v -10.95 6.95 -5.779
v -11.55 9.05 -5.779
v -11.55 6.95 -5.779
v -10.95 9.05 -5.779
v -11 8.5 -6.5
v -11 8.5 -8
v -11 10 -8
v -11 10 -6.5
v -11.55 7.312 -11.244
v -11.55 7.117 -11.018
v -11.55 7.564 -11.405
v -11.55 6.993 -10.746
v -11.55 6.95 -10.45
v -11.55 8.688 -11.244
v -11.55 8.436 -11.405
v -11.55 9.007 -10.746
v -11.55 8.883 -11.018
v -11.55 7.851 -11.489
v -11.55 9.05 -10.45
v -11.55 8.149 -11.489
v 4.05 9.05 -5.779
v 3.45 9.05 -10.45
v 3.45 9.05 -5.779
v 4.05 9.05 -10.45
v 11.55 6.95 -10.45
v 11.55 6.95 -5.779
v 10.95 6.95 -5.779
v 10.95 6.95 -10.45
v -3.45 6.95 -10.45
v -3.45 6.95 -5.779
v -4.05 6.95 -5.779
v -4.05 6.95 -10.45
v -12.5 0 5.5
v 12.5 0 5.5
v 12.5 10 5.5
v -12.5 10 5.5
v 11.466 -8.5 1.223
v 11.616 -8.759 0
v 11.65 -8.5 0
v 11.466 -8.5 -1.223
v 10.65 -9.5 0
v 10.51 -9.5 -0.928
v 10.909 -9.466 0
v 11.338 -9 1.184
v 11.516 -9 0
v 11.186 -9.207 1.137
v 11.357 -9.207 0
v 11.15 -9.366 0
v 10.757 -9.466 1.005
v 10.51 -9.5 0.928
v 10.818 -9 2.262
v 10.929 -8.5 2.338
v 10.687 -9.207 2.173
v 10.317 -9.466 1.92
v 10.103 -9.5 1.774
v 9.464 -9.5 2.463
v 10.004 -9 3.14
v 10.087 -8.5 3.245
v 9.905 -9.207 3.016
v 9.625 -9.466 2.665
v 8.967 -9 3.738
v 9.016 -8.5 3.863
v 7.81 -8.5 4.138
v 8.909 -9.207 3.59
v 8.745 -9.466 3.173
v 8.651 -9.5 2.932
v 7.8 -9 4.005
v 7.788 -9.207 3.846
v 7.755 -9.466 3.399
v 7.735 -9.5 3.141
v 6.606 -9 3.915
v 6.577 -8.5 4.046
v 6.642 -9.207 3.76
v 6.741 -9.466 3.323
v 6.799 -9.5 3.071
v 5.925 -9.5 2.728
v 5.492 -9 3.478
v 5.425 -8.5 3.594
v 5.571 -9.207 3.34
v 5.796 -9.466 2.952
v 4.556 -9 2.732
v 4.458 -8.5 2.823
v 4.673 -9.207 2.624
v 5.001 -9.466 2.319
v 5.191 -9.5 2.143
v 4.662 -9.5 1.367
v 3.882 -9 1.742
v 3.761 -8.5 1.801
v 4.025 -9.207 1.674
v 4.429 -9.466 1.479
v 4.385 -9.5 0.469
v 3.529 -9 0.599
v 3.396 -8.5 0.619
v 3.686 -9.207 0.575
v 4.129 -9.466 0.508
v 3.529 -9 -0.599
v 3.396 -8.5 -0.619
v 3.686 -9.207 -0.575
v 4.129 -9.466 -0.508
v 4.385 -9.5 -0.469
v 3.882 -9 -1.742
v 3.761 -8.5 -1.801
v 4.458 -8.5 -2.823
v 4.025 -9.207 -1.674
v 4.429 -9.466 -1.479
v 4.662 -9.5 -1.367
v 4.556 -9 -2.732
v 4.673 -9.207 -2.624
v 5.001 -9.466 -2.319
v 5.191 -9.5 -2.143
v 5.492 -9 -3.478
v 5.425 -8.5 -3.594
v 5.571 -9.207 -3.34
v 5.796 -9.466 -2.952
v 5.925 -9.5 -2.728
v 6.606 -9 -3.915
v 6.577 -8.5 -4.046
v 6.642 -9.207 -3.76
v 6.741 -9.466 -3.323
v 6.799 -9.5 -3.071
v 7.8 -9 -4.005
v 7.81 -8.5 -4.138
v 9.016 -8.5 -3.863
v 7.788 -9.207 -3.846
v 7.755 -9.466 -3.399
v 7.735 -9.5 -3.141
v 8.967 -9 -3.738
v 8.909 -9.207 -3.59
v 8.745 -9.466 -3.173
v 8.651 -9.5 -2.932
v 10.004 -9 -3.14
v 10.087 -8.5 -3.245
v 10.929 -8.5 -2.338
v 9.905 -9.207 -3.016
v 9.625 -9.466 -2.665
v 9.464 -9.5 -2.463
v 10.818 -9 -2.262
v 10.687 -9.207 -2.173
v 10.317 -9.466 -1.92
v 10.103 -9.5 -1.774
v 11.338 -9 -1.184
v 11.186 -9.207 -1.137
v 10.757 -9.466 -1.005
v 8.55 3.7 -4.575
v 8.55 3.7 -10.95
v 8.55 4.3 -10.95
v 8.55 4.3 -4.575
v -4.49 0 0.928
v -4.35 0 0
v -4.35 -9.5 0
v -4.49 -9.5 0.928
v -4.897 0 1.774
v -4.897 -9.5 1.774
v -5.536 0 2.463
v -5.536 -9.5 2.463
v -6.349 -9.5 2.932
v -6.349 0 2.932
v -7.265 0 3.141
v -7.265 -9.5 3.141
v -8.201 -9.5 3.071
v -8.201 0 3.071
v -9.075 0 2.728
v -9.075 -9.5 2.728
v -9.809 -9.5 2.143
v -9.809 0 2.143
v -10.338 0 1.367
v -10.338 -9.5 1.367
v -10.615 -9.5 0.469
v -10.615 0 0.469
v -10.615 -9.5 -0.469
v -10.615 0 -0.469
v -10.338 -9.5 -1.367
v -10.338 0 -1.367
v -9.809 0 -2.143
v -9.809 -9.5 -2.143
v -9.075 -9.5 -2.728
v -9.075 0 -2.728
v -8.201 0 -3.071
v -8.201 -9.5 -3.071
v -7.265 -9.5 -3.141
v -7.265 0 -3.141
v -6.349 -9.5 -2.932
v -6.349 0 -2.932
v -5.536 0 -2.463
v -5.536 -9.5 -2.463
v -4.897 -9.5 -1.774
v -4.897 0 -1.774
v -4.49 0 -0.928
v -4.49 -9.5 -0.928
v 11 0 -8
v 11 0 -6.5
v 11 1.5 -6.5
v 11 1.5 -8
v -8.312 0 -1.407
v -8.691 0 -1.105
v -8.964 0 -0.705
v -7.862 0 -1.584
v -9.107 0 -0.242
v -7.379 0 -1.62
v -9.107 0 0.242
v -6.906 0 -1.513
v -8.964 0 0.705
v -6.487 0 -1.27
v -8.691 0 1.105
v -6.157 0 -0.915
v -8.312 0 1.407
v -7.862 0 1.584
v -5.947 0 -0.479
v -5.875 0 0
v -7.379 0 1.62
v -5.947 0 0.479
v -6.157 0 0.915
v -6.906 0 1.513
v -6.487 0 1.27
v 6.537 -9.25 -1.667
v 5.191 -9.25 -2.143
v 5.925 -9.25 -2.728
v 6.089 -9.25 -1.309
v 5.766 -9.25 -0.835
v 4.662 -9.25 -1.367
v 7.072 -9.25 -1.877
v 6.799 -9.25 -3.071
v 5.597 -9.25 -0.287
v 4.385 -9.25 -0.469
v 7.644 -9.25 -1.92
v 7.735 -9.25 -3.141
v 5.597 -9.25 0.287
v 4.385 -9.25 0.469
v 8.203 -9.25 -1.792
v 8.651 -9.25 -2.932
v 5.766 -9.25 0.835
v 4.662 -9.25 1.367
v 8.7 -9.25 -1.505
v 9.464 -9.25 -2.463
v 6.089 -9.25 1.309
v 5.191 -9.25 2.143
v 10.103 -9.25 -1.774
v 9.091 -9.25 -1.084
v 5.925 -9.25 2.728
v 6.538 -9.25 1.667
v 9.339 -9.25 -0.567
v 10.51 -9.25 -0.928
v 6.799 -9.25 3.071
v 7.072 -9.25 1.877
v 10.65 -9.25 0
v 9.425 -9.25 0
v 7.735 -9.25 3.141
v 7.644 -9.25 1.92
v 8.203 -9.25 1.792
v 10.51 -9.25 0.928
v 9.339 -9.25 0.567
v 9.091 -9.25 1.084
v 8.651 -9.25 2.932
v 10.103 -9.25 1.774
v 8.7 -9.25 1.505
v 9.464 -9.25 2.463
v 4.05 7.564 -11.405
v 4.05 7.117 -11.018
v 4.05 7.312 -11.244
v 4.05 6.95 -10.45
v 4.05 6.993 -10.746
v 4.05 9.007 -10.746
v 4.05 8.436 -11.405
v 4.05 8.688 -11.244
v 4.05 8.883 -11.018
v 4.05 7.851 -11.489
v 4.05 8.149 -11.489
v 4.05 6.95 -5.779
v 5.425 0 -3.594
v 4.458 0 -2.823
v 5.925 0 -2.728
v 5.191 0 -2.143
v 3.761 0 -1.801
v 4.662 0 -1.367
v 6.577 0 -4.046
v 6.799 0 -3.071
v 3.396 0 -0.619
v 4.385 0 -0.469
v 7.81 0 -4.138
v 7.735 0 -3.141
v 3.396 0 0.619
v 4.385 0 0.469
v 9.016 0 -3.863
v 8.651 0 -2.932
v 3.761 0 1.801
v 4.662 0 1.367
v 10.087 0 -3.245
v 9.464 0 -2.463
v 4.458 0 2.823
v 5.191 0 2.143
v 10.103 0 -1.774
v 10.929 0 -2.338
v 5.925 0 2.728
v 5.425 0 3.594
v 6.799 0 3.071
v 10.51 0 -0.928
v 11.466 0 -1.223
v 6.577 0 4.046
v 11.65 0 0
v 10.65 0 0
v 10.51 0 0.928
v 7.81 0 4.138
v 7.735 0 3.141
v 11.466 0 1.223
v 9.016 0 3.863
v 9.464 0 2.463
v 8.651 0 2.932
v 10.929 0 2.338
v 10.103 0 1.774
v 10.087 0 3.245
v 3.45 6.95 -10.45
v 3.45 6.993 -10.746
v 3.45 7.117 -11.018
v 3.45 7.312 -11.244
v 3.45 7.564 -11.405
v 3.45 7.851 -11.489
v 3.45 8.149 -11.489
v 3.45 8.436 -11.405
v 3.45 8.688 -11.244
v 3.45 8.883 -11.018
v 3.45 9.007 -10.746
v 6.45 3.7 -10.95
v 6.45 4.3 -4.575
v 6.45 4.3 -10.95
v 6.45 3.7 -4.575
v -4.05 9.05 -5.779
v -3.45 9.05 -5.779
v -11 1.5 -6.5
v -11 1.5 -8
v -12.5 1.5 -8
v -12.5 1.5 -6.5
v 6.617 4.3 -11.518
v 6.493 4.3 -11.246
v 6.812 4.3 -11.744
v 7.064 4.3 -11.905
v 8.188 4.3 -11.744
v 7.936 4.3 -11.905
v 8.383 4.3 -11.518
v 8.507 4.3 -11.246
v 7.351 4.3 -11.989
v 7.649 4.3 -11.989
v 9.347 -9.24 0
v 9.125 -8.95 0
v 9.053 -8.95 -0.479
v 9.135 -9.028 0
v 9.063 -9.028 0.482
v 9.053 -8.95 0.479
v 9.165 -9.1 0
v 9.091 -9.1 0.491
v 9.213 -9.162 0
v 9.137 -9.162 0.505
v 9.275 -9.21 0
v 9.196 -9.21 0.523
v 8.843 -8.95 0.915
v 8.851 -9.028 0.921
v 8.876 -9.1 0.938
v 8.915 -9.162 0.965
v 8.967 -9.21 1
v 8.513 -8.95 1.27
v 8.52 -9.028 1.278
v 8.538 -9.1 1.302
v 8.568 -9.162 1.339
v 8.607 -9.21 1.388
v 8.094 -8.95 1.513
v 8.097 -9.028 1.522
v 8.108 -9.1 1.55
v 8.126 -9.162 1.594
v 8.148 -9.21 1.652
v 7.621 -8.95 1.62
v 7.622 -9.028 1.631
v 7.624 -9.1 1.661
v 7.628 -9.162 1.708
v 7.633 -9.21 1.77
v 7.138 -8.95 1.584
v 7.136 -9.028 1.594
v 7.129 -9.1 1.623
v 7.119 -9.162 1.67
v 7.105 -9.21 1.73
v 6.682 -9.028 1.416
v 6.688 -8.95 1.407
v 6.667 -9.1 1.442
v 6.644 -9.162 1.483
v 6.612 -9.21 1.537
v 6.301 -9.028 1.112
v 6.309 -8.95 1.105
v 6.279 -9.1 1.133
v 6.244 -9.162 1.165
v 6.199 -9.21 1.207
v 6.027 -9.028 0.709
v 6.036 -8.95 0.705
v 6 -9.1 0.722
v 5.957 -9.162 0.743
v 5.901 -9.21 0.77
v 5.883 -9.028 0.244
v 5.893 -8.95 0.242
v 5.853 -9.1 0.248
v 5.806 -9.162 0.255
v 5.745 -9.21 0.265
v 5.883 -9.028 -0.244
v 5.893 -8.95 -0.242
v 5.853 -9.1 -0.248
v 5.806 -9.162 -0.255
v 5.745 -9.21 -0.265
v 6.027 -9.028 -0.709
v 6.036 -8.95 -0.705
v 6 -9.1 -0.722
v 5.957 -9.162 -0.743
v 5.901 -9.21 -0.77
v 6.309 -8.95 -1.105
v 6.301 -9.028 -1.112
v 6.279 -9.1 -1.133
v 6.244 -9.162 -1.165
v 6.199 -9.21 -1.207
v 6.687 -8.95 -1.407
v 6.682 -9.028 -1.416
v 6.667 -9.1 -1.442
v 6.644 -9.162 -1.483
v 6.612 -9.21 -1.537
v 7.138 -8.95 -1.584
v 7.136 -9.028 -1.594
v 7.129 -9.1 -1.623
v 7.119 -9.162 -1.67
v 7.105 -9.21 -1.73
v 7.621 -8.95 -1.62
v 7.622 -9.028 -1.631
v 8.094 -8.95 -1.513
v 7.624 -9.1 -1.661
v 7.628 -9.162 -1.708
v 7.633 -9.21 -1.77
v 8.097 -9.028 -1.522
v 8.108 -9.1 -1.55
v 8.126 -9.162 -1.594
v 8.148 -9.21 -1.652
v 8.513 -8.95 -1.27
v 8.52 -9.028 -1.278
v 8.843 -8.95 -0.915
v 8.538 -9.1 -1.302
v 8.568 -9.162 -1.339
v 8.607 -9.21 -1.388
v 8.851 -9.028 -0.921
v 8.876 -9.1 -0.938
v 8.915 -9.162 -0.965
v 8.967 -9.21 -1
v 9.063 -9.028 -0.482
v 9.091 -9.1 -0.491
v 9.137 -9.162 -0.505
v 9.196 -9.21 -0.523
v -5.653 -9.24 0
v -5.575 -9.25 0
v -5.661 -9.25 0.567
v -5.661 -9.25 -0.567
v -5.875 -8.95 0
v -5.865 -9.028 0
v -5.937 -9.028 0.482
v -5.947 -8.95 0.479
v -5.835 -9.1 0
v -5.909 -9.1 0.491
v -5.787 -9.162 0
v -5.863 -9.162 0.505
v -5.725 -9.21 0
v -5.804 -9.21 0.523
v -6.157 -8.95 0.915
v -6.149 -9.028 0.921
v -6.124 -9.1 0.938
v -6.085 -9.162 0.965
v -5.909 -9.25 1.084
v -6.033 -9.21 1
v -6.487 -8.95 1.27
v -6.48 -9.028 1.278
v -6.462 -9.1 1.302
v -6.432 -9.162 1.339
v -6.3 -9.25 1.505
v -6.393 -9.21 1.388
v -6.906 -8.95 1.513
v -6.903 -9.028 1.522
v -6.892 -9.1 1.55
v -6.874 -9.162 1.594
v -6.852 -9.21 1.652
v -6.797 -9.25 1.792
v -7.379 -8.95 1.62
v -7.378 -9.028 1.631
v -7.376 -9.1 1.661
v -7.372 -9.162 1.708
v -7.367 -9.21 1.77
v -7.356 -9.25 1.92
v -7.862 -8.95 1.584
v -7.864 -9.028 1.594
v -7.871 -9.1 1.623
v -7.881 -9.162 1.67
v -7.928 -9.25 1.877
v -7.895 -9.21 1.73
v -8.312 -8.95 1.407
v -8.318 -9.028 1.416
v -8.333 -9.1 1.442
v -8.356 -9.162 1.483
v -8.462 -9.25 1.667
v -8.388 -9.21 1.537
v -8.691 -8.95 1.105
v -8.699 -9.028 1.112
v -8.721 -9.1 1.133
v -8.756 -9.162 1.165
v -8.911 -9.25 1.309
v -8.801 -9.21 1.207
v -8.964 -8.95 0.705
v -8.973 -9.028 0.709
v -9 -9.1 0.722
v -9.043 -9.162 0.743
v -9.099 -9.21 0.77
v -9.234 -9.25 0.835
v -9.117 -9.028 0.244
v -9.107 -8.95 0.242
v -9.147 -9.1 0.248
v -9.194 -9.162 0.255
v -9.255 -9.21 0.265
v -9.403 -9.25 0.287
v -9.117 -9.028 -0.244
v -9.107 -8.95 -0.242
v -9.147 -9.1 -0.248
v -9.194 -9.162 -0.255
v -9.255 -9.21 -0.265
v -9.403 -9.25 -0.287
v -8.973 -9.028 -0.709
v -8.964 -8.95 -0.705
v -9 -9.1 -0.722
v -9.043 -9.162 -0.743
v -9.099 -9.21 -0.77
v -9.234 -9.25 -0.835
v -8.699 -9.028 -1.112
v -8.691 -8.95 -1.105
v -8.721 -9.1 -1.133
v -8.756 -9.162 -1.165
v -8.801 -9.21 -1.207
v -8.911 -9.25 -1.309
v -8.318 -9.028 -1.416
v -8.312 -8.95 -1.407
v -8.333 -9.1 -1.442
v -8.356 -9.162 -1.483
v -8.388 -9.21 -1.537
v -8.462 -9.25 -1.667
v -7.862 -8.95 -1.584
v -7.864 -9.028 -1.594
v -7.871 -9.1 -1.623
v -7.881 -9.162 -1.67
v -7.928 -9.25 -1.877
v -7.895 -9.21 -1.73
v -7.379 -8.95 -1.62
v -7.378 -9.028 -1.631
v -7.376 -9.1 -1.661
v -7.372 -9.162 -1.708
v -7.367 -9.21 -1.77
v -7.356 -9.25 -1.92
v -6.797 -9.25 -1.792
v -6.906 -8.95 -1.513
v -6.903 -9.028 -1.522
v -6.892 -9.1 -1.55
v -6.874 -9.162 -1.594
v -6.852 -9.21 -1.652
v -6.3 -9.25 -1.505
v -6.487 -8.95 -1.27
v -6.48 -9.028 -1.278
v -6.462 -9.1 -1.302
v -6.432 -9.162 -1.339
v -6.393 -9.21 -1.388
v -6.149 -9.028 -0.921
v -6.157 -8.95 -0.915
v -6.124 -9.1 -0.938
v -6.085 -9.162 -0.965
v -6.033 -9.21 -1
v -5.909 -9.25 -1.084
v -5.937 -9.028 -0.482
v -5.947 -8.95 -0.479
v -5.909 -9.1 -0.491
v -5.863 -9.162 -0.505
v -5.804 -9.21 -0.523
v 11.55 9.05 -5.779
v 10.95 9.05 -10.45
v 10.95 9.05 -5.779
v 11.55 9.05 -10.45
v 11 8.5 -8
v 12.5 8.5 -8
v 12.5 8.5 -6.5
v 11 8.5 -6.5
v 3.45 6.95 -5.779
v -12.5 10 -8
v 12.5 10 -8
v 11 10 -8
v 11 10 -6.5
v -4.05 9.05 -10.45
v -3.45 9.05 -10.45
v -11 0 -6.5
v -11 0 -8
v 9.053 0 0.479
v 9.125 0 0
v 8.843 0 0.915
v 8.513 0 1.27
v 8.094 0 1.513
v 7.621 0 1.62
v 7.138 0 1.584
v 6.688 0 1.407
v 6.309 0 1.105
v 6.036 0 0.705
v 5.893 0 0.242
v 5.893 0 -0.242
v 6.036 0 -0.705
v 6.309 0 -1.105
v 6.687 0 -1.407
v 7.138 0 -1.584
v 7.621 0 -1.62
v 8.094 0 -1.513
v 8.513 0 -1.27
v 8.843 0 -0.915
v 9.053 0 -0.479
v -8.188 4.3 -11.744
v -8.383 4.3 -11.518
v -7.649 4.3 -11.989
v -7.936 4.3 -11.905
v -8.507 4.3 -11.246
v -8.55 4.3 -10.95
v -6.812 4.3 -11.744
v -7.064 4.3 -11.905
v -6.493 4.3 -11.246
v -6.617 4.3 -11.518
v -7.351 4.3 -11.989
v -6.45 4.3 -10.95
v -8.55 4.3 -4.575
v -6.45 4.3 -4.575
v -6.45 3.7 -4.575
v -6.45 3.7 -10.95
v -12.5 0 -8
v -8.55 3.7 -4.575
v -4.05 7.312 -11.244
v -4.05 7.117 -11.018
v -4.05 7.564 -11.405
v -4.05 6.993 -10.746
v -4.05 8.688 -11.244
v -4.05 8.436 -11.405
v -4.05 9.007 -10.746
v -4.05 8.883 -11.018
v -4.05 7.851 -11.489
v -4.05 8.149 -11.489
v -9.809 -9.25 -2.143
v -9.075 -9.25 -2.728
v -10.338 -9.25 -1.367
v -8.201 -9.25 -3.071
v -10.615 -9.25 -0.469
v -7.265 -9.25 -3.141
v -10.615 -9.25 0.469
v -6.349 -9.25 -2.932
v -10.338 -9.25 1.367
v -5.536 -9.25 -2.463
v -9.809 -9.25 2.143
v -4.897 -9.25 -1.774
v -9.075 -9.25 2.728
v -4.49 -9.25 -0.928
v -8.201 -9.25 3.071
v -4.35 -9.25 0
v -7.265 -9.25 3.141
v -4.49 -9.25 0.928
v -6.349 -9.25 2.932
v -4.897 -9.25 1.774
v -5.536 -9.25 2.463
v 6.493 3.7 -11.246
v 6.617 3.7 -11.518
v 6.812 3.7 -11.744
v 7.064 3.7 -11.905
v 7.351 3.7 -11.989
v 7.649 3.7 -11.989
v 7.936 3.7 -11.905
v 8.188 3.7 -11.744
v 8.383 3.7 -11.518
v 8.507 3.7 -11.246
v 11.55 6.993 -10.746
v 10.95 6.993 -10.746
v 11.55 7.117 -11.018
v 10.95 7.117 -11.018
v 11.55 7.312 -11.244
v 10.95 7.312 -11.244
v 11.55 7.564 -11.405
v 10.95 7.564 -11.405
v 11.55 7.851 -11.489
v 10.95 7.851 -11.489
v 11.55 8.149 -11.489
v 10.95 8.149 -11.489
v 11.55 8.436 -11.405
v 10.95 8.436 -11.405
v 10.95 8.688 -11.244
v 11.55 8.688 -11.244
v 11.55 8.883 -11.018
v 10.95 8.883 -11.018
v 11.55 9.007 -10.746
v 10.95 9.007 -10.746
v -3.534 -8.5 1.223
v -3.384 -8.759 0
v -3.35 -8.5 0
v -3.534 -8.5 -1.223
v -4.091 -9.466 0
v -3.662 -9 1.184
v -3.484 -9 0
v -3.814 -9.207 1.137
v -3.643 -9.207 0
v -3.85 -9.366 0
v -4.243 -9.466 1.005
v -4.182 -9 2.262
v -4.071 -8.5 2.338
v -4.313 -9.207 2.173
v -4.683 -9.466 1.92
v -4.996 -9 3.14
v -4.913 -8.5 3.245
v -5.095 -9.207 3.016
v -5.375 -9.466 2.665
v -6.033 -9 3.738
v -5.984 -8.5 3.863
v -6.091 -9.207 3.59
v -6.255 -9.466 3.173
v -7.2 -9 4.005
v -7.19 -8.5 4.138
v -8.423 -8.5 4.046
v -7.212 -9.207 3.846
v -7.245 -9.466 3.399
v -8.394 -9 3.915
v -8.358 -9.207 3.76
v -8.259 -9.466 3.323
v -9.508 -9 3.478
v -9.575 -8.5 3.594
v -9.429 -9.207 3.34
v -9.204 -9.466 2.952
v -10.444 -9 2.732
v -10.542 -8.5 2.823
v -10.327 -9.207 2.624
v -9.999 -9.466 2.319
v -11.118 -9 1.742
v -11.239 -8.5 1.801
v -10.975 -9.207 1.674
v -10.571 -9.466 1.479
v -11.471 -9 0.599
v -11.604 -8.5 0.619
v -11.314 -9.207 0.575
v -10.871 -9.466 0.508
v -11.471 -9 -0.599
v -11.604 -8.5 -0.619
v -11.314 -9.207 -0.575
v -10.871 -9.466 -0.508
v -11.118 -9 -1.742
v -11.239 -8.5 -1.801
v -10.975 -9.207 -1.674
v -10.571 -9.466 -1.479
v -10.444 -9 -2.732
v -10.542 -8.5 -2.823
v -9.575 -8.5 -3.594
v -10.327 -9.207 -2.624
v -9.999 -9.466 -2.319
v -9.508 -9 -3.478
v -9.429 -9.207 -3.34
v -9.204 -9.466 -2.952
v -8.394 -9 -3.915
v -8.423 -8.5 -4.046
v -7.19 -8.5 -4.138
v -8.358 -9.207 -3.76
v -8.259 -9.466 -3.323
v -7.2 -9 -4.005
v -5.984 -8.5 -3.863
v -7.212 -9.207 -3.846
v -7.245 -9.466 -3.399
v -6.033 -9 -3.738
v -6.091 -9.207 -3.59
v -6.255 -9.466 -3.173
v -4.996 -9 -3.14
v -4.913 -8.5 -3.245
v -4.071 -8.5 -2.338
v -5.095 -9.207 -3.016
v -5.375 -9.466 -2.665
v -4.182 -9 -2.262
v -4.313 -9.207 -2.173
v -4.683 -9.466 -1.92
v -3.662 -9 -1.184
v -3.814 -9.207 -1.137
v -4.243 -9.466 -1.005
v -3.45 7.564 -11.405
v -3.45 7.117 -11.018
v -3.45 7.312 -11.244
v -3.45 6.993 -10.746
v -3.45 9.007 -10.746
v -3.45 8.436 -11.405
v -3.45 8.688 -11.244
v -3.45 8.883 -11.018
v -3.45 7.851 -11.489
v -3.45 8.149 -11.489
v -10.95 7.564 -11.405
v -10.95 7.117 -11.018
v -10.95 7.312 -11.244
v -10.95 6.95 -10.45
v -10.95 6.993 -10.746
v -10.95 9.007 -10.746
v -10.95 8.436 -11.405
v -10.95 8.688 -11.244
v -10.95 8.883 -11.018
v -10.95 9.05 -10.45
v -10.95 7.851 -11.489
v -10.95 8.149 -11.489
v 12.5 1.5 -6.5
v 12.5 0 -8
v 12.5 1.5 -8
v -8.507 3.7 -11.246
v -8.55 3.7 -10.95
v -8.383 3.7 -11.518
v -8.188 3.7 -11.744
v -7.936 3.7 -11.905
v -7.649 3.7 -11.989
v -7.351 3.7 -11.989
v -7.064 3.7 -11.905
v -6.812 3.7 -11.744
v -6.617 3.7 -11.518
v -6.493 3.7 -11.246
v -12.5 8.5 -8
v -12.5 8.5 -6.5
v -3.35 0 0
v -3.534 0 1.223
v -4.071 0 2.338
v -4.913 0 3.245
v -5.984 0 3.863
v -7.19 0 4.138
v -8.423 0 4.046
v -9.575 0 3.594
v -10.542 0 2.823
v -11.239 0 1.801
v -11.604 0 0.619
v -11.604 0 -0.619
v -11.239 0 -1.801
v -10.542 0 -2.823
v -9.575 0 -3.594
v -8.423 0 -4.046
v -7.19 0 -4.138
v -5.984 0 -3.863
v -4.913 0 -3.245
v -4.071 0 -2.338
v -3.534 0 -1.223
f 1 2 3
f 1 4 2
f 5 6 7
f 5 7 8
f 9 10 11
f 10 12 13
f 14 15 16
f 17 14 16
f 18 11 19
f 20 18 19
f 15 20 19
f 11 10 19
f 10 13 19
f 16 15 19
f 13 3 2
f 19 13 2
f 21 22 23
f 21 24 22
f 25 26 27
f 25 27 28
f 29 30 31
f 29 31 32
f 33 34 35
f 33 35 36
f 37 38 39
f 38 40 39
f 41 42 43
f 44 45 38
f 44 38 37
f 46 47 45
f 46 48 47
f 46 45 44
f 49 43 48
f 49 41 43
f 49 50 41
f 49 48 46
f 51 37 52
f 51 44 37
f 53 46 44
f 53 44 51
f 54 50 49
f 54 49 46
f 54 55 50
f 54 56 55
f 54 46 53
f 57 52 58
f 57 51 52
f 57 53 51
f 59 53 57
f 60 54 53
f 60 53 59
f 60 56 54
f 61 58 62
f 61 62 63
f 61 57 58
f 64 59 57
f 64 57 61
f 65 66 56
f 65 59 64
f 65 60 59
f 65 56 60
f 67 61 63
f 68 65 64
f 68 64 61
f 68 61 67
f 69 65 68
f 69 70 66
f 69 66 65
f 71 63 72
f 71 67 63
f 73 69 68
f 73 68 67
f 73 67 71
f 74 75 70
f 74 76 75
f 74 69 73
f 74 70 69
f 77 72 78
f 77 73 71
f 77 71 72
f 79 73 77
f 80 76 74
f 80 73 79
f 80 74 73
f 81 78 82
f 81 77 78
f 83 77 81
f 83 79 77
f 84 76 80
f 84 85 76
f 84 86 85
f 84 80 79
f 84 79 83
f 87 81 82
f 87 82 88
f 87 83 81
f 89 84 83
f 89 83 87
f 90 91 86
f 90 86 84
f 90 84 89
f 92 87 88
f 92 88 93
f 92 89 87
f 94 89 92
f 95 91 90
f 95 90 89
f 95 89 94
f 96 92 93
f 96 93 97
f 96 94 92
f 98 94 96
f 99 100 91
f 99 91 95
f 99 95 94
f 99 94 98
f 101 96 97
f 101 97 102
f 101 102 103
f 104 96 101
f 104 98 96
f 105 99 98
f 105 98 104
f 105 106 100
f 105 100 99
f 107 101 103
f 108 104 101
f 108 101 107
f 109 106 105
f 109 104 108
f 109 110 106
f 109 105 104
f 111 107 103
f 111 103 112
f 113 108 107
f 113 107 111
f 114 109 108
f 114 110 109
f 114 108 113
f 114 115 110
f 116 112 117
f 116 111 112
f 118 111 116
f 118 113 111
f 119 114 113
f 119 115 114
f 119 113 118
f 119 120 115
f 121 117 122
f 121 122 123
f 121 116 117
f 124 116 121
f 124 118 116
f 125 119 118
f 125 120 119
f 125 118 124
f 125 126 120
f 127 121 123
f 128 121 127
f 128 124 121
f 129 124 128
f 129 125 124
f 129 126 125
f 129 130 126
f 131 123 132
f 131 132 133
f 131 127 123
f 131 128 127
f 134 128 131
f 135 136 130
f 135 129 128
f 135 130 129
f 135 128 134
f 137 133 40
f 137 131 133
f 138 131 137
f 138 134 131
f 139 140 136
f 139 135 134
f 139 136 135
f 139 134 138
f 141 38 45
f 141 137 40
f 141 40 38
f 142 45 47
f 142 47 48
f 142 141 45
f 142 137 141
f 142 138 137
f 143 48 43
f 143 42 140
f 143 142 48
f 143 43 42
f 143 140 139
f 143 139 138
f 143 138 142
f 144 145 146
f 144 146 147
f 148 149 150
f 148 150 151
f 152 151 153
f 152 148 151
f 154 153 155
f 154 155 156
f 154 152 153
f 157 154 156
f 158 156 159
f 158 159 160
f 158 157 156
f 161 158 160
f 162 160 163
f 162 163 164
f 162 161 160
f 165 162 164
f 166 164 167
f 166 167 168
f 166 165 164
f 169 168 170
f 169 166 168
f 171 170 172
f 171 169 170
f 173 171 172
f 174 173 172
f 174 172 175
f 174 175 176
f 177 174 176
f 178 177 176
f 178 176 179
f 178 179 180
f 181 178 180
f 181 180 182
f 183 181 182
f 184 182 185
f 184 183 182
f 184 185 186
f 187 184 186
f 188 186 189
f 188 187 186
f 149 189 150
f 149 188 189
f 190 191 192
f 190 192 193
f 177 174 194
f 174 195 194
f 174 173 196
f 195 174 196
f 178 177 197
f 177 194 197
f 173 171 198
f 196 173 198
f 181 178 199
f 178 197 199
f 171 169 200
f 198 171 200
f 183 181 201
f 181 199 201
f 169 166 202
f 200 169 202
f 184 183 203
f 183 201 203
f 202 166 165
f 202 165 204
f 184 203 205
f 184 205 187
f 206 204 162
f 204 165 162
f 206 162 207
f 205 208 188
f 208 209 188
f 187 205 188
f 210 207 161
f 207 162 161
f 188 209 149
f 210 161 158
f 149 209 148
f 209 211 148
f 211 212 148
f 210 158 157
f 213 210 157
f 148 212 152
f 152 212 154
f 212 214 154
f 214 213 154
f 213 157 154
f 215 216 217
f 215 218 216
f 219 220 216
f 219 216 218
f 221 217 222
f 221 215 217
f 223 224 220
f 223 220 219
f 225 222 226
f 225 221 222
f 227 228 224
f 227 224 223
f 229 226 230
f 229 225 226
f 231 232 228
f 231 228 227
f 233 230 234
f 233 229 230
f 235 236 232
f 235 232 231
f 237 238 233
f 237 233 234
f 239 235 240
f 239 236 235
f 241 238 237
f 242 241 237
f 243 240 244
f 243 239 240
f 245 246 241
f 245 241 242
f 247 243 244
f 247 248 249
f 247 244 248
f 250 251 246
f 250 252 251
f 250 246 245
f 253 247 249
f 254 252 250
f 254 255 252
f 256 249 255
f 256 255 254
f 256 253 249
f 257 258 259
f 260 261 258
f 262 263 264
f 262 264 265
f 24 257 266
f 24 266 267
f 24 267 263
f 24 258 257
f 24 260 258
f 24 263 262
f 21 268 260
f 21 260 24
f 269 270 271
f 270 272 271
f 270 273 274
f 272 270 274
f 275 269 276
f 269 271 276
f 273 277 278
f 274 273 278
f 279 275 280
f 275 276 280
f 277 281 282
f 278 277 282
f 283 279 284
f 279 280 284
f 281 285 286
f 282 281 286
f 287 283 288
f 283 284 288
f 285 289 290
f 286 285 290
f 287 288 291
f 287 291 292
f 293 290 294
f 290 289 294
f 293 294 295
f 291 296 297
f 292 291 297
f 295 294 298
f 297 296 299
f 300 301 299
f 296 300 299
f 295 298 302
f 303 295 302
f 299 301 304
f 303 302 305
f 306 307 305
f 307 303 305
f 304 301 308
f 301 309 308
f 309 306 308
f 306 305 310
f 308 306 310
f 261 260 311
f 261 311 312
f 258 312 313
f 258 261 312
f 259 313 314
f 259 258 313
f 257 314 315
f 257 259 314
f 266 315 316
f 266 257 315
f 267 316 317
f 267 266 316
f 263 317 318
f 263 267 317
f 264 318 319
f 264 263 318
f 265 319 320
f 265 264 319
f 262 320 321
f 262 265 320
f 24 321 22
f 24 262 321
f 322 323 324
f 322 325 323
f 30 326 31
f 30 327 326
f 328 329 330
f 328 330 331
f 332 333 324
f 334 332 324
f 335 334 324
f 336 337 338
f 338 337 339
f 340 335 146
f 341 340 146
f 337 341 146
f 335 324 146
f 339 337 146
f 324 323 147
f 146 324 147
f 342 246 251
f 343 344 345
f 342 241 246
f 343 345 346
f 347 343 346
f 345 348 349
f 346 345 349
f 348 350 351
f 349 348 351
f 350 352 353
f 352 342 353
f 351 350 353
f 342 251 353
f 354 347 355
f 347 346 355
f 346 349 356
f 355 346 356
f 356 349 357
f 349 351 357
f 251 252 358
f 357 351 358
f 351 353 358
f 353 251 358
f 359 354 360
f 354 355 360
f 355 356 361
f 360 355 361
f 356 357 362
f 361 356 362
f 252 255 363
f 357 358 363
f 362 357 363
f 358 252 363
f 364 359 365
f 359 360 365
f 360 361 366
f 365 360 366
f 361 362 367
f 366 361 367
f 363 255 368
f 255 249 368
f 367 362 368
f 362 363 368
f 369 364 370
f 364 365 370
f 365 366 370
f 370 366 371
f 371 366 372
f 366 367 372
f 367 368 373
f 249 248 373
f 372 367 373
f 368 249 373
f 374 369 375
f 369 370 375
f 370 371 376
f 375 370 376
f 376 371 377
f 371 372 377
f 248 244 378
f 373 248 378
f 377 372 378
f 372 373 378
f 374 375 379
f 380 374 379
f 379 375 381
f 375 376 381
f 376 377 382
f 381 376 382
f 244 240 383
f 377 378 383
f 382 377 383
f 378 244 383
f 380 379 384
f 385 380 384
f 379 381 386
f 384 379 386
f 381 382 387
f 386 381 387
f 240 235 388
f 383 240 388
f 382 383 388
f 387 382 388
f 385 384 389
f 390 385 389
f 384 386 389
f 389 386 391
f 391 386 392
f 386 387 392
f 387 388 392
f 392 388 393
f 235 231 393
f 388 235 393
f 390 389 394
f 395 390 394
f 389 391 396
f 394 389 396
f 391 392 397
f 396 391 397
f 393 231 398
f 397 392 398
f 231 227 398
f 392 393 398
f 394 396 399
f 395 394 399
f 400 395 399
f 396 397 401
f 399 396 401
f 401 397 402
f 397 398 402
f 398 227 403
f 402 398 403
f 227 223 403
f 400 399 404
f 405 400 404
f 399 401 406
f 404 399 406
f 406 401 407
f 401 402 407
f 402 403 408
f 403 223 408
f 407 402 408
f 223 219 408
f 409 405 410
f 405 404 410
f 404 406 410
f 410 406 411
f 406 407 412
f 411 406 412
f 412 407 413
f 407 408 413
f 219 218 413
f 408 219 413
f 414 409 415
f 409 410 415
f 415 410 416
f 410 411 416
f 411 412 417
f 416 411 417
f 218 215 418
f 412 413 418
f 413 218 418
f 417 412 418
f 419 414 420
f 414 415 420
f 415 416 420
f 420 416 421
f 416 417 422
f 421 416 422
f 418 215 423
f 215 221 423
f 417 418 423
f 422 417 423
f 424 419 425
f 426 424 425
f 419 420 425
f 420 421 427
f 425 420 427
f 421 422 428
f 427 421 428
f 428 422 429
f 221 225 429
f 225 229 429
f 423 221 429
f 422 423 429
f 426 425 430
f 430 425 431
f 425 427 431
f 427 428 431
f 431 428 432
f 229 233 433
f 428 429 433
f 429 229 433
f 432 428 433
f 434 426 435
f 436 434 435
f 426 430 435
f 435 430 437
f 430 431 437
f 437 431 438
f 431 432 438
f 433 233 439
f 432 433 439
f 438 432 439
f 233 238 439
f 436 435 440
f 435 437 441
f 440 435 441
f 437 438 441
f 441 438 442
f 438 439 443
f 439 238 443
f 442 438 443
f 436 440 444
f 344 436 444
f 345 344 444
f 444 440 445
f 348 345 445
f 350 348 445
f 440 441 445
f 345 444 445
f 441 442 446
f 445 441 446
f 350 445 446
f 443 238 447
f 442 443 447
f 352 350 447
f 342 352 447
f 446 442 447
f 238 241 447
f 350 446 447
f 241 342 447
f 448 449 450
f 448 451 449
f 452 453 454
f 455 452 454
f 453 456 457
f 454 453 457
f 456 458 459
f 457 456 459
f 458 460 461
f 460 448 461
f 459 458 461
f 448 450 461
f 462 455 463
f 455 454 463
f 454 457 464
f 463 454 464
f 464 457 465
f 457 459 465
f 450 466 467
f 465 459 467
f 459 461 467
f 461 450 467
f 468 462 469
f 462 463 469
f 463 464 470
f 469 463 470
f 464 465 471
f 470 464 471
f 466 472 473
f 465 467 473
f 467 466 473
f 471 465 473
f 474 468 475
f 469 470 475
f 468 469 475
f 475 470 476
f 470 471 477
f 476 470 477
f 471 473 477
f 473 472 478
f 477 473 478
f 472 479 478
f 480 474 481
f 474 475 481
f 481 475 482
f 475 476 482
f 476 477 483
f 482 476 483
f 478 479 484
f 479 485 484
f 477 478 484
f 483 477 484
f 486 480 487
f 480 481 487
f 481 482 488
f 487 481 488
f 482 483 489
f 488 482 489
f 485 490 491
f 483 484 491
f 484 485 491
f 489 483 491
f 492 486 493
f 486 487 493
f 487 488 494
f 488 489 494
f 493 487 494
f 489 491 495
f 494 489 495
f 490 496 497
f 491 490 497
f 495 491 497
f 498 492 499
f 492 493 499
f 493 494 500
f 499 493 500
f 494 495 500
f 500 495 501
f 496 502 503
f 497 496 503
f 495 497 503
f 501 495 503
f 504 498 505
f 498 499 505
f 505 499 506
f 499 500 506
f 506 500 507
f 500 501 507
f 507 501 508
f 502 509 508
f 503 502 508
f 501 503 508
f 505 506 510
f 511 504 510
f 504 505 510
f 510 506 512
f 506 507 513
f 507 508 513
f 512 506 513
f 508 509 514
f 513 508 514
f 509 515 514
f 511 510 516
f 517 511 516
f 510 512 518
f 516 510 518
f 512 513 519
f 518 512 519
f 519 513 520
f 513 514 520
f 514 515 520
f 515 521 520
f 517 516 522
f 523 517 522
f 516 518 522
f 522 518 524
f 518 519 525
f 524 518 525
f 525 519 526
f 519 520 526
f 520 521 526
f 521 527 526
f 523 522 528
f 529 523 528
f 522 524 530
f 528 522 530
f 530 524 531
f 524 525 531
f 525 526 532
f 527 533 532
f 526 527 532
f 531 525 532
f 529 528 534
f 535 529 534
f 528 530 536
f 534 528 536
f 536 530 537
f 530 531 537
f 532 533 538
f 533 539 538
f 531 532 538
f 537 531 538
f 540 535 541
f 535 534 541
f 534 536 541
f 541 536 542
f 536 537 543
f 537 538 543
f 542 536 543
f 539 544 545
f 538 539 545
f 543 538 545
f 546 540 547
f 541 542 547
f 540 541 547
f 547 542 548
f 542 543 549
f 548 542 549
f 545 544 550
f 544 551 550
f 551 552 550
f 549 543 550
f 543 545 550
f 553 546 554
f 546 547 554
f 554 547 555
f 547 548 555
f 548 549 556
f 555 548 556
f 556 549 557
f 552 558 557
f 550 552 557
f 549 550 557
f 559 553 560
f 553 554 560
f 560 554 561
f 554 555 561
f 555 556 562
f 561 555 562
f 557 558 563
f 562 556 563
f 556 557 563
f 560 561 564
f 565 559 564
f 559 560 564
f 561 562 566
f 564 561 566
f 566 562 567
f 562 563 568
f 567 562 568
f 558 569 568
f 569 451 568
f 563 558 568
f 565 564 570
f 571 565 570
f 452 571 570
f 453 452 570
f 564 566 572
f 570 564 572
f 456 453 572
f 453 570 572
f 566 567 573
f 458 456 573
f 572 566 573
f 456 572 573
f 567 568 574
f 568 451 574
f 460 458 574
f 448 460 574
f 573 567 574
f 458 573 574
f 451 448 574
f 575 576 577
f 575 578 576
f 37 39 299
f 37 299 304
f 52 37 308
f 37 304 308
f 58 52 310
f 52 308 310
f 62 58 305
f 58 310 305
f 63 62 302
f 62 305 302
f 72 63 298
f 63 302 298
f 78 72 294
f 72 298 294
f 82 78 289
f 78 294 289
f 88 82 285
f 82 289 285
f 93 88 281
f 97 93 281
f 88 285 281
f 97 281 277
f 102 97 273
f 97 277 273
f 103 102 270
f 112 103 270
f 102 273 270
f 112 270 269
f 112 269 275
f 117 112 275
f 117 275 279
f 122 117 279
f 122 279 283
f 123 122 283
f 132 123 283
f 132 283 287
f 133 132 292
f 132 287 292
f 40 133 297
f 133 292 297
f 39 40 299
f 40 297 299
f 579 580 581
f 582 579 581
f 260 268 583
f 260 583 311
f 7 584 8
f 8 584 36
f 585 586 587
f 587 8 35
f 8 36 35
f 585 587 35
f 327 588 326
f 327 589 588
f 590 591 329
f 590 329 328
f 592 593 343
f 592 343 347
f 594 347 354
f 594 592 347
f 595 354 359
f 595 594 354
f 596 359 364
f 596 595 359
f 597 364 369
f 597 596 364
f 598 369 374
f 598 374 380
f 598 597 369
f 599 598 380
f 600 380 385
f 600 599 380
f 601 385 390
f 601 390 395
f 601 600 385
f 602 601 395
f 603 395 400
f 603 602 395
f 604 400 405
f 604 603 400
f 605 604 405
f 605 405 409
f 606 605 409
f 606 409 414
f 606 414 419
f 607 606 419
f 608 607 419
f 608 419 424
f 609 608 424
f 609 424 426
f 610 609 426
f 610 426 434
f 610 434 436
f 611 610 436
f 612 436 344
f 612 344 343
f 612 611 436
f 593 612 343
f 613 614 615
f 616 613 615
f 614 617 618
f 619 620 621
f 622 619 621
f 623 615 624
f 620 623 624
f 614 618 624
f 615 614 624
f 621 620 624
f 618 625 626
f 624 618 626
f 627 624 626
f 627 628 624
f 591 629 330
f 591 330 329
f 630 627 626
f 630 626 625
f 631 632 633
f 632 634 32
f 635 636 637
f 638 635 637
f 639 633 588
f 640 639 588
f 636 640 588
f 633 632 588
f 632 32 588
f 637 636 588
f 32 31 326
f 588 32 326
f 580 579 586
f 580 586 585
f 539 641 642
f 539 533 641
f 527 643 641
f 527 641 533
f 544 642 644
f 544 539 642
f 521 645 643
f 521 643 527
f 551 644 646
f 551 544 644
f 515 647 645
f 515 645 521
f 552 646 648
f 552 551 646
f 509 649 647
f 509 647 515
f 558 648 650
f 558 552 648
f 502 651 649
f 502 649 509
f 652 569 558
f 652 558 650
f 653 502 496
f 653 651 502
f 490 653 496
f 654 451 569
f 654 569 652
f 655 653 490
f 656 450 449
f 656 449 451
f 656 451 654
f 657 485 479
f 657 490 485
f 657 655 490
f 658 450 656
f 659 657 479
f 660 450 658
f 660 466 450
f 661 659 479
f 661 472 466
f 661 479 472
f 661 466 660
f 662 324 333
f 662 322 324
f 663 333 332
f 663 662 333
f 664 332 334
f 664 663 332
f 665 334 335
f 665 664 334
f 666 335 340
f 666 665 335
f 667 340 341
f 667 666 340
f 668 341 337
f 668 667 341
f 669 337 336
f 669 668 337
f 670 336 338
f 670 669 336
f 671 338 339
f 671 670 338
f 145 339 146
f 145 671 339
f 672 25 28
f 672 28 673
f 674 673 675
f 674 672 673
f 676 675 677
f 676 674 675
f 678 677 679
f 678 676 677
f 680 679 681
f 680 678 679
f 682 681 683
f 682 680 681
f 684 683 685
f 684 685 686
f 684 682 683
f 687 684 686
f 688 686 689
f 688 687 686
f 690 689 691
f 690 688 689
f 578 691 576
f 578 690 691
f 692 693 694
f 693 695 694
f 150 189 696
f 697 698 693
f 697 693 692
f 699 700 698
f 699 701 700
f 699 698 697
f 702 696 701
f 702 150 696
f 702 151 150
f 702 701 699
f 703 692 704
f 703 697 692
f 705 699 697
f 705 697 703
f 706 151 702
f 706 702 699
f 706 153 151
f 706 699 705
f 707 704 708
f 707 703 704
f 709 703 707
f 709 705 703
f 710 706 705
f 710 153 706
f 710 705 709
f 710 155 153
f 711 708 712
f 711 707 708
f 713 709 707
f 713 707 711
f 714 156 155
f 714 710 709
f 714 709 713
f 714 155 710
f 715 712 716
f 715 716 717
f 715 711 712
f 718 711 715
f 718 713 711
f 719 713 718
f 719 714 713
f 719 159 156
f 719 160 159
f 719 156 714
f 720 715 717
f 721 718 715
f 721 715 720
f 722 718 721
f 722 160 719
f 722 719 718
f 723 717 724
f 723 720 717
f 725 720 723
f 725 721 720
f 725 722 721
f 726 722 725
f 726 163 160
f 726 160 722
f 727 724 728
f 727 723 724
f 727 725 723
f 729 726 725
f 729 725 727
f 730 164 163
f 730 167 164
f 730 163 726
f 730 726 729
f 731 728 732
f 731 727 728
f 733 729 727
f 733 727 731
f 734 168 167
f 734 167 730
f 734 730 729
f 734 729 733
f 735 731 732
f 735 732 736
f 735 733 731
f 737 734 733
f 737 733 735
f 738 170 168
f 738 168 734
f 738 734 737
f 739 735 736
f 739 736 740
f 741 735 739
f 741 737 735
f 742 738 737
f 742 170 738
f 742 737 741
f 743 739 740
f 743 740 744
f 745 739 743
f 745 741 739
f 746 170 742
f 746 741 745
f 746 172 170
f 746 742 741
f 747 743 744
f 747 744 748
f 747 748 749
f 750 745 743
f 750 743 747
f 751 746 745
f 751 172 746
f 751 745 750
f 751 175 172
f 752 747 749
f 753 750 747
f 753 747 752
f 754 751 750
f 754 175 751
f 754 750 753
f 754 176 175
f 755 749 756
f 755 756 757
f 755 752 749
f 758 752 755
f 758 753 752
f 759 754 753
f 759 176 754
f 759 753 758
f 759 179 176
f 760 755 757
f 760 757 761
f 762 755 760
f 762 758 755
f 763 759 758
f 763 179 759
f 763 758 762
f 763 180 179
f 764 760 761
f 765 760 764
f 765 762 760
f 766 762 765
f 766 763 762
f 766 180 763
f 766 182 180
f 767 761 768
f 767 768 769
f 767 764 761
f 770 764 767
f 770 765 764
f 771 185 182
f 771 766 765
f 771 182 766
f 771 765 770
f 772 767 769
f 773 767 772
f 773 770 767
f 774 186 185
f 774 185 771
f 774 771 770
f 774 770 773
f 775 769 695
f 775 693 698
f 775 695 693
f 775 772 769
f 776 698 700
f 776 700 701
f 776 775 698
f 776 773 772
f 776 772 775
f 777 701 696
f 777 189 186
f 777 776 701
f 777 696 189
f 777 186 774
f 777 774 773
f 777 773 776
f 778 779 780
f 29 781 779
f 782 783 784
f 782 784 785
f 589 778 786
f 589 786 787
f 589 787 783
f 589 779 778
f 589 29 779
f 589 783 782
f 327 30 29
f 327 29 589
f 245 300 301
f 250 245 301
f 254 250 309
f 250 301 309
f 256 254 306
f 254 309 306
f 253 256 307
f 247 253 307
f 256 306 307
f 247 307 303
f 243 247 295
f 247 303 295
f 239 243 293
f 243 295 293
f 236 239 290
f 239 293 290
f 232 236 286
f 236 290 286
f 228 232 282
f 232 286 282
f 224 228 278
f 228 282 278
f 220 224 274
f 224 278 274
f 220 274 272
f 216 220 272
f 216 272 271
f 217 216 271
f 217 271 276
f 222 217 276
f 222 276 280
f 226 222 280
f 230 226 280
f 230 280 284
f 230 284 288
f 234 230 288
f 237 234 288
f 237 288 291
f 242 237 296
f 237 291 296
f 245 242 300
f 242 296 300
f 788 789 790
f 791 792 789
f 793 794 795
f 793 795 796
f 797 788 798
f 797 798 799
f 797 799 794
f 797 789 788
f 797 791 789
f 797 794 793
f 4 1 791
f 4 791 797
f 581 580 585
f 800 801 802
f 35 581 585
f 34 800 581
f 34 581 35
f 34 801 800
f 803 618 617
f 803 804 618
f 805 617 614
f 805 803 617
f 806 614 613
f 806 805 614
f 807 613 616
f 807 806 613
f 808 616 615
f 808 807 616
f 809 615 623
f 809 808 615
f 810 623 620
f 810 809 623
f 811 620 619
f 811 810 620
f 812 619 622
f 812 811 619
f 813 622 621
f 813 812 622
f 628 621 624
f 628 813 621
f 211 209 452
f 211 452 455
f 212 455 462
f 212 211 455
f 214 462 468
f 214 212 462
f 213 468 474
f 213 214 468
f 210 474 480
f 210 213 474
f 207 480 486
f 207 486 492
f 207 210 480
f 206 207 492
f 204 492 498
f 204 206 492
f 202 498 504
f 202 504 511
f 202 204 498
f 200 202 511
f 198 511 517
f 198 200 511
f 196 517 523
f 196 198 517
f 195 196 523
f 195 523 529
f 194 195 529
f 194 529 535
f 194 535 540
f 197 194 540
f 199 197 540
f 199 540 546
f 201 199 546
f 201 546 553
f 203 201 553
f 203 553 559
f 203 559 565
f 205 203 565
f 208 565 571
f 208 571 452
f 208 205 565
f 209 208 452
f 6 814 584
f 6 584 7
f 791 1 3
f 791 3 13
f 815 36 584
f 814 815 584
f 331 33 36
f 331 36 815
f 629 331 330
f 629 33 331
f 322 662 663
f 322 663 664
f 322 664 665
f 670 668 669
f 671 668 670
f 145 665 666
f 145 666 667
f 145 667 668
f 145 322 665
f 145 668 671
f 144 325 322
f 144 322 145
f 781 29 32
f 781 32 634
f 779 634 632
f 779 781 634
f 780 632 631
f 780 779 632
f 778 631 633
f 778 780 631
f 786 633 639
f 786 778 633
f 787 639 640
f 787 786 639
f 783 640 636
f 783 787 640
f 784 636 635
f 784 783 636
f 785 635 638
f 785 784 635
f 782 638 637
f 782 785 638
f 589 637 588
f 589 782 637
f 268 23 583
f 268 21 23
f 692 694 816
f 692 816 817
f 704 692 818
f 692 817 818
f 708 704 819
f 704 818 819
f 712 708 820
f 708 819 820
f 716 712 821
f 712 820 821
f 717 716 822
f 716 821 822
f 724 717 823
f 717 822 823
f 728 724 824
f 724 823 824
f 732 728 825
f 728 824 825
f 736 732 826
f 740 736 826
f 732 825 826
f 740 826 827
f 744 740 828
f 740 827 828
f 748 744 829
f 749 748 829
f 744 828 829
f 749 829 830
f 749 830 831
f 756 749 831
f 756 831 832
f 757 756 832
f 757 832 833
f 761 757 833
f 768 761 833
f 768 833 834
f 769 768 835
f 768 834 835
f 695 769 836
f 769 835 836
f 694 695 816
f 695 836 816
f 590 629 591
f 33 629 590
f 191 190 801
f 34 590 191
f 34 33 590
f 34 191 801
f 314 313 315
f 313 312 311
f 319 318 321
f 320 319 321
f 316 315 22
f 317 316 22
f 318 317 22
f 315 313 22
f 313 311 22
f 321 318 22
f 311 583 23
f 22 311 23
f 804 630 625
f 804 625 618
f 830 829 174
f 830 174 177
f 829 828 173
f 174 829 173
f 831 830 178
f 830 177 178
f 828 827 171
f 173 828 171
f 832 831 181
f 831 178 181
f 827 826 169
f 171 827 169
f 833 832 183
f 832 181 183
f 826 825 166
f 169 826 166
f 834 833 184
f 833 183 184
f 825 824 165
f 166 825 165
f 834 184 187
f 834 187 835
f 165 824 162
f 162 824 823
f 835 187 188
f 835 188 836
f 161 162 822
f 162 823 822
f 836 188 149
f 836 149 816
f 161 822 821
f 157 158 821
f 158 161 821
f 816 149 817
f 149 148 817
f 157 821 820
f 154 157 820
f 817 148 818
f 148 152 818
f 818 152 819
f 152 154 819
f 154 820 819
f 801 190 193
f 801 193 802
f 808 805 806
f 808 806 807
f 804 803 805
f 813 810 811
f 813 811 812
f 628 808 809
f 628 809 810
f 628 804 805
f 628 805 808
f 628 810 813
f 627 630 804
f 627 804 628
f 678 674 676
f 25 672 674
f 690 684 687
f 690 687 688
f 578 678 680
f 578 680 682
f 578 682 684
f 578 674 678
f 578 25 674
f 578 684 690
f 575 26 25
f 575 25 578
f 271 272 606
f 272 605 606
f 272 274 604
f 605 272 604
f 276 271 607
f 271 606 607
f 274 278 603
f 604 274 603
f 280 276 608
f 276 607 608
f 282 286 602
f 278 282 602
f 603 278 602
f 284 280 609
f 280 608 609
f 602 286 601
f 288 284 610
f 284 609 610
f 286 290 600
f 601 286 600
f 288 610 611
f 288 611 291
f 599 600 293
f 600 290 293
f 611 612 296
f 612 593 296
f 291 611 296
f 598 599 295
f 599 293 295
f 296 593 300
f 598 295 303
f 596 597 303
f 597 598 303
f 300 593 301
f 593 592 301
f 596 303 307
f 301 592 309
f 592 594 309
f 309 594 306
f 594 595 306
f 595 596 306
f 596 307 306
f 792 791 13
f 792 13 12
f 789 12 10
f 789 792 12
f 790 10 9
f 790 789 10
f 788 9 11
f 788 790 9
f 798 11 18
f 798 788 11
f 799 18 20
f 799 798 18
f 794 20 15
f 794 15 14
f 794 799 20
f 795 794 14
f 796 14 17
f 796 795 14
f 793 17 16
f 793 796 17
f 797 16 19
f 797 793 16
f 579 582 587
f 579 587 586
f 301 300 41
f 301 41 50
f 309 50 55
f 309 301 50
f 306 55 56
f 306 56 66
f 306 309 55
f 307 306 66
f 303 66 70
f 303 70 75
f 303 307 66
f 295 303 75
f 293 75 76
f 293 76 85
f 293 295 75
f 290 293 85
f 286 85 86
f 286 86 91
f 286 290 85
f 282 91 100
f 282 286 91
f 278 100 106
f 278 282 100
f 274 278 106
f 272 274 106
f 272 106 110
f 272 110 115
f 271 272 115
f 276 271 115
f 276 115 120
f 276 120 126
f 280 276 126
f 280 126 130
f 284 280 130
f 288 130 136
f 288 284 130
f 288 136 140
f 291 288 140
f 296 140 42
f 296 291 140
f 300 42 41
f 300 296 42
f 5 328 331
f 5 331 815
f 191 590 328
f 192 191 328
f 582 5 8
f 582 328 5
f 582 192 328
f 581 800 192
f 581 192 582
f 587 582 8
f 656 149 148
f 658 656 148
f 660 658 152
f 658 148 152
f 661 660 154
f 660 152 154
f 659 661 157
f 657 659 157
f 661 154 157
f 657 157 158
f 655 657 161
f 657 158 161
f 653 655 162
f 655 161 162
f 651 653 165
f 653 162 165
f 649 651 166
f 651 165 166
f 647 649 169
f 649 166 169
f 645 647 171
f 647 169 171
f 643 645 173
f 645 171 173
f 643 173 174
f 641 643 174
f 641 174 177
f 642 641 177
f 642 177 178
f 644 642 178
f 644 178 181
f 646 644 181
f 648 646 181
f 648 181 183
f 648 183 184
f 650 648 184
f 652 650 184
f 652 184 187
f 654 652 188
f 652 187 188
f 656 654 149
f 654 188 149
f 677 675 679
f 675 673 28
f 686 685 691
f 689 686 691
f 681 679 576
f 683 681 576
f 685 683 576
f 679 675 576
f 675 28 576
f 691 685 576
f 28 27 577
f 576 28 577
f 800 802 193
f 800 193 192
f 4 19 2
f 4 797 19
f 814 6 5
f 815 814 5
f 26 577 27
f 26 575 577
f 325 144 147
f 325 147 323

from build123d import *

# Parameters (mm, degrees)
F0_R           = 4.15
F0_R_2         = 3.15
F1_DEPTH       = 9.5
F0_R_3         = 1.625
F2_DEPTH       = 9.25
F3_R           = 0.99999
F3_2_R         = 0.99999
F4_DEPTH       = 10
F6_W           = 7
F6_H           = 1.5
F7_DEPTH       = 25
F10_DEPTH      = 0.3
F10_DEPTH_BACK = 0.3
F19_DEPTH      = 0.3
F19_DEPTH_BACK = 0.3
F20_R          = 0.3
F20_2_R        = 0.3


# Not quite as in the source:
# - a fillet or chamfer is up to 0.001 mm smaller than in the source, because OpenCascade refuses the exact size


with BuildPart() as f1:
    # F0 (on Front) → F1 (new body)
    with BuildSketch(Plane.XZ):
        with Locations((-7.5, 0)):
            Circle(F0_R)
        with Locations((-7.5, 0)):
            Circle(F0_R_2, mode=Mode.SUBTRACT)
    extrude(amount=F1_DEPTH)

    # F3 (radius 1 in the source; OpenCascade refuses exactly that, so slightly less here)
    f3_edges = [f1.edges().sort_by_distance(p)[0] for p in [
        (-11.65, -9.5, 0),
    ]]
    fillet(f3_edges, radius=F3_R)


with BuildPart() as f1b:
    # F0 (on Front) → F1, piece 2 (new body)
    with BuildSketch(Plane.XZ):
        with Locations((7.5, 0)):
            Circle(F0_R)
        with Locations((7.5, 0)):
            Circle(F0_R_2, mode=Mode.SUBTRACT)
    extrude(amount=F1_DEPTH)

    # F3#2 (radius 1 in the source; OpenCascade refuses exactly that, so slightly less here)
    f3_2_edges = [f1b.edges().sort_by_distance(p)[0] for p in [
        (3.35, -9.5, 0),
    ]]
    fillet(f3_2_edges, radius=F3_2_R)


with BuildPart() as f2:
    # F0 (on Front) → F2 (new body)
    with BuildSketch(Plane.XZ):
        with Locations((-7.5, 0)):
            Circle(F0_R_2)
        with Locations((-7.5, 0)):
            Circle(F0_R_3, mode=Mode.SUBTRACT)
    extrude(amount=F2_DEPTH)

    # F20
    f20_edges = [f2.edges().sort_by_distance(p)[0] for p in [
        (-9.125, -9.25, 0),
    ]]
    fillet(f20_edges, radius=F20_R)


with BuildPart() as f2b:
    # F0 (on Front) → F2, piece 2 (new body)
    with BuildSketch(Plane.XZ):
        with Locations((7.5, 0)):
            Circle(F0_R_2)
        with Locations((7.5, 0)):
            Circle(F0_R_3, mode=Mode.SUBTRACT)
    extrude(amount=F2_DEPTH)

    # F20#2
    f20_2_edges = [f2b.edges().sort_by_distance(p)[0] for p in [
        (5.875, -9.25, 0),
    ]]
    fillet(f20_2_edges, radius=F20_2_R)


with BuildPart() as f4:
    # F0 (on Front) → F4 (new body)
    with BuildSketch(Plane.XZ):
        Polygon((12.5, 5.5), (-12.5, 5.5), (-12.5, -8), (-11, -8), (-11, -6.5), (11, -6.5), (11, -8), (12.5, -8), align=None)
        with Locations((-7.5, 0)):
            Circle(F0_R, mode=Mode.SUBTRACT)
        with Locations((7.5, 0)):
            Circle(F0_R, mode=Mode.SUBTRACT)
        with Locations((7.5, 0)):
            Circle(F0_R)
        with Locations((7.5, 0)):
            Circle(F0_R_2, mode=Mode.SUBTRACT)
        with Locations((-7.5, 0)):
            Circle(F0_R)
        with Locations((-7.5, 0)):
            Circle(F0_R_2, mode=Mode.SUBTRACT)
        with Locations((7.5, 0)):
            Circle(F0_R_2)
        with Locations((7.5, 0)):
            Circle(F0_R_3, mode=Mode.SUBTRACT)
        with Locations((-7.5, 0)):
            Circle(F0_R_2)
        with Locations((-7.5, 0)):
            Circle(F0_R_3, mode=Mode.SUBTRACT)
        with Locations((7.5, 0)):
            Circle(F0_R_3)
        with Locations((-7.5, 0)):
            Circle(F0_R_3)
    extrude(amount=-F4_DEPTH)

    # F6 (on offset) → F7 (cut)
    with BuildSketch(Plane.YZ.offset(12.5)):
        with Locations((5, -7.25)):
            Rectangle(F6_W, F6_H)
    extrude(amount=-F7_DEPTH, mode=Mode.SUBTRACT)


with BuildPart() as f10:
    # F9 (on offset) → F10 (new body, two sides)
    with BuildSketch(Plane.XZ.offset(-4)) as f10_sk:
        with BuildLine():
            Line((-6.45, -10.95), (-6.45, -4.5750031686))
            Line((-6.45, -4.5750031686), (-8.55, -4.5750031686))
            Line((-8.55, -4.5750031686), (-8.55, -10.95))
            ThreePointArc((-8.55, -10.95), (-7.5, -12), (-6.45, -10.95))
        make_face()
    extrude(amount=F10_DEPTH)
    extrude(f10_sk.sketch, amount=-F10_DEPTH_BACK)


with BuildPart() as f10b:
    # F9 (on offset) → F10, piece 2 (new body, two sides)
    with BuildSketch(Plane.XZ.offset(-4)) as f10_2_sk:
        with BuildLine():
            ThreePointArc((6.45, -10.95), (7.5, -12), (8.55, -10.95))
            Line((8.55, -10.95), (8.55, -4.5750031686))
            Line((8.55, -4.5750031686), (6.45, -4.5750031686))
            Line((6.45, -4.5750031686), (6.45, -10.95))
        make_face()
    extrude(amount=F10_DEPTH)
    extrude(f10_2_sk.sketch, amount=-F10_DEPTH_BACK)


with BuildPart() as f19:
    # F18 (on offset) → F19 (new body, two sides)
    with BuildSketch(Plane.YZ.offset(-11.25)) as f19_sk:
        with BuildLine():
            Line((9.05, -5.7792608787), (6.95, -5.7792608787))
            Line((6.95, -5.7792608787), (6.95, -10.45))
            ThreePointArc((6.95, -10.45), (8, -11.5), (9.05, -10.45))
            Line((9.05, -10.45), (9.05, -5.7792608787))
        make_face()
    extrude(amount=F19_DEPTH)
    extrude(f19_sk.sketch, amount=-F19_DEPTH_BACK)


with BuildPart() as f19b:
    # F17 (on offset) → F19, piece 2 (new body, two sides)
    with BuildSketch(Plane.YZ.offset(-3.75)) as f19_2_sk:
        with BuildLine():
            Line((9.05, -5.7792608787), (6.95, -5.7792608787))
            Line((6.95, -5.7792608787), (6.95, -10.45))
            ThreePointArc((6.95, -10.45), (8, -11.5), (9.05, -10.45))
            Line((9.05, -10.45), (9.05, -5.7792608787))
        make_face()
    extrude(amount=F19_DEPTH)
    extrude(f19_2_sk.sketch, amount=-F19_DEPTH_BACK)


with BuildPart() as f19c:
    # F16 (on offset) → F19, piece 3 (new body, two sides)
    with BuildSketch(Plane.YZ.offset(3.75)) as f19_3_sk:
        with BuildLine():
            Line((9.05, -5.7792608787), (6.95, -5.7792608787))
            Line((6.95, -5.7792608787), (6.95, -10.45))
            ThreePointArc((6.95, -10.45), (8, -11.5), (9.05, -10.45))
            Line((9.05, -10.45), (9.05, -5.7792608787))
        make_face()
    extrude(amount=F19_DEPTH)
    extrude(f19_3_sk.sketch, amount=-F19_DEPTH_BACK)


with BuildPart() as f19d:
    # F15 (on offset) → F19, piece 4 (new body, two sides)
    with BuildSketch(Plane.YZ.offset(11.25)) as f19_4_sk:
        with BuildLine():
            Line((9.05, -5.7792608787), (6.95, -5.7792608787))
            Line((6.95, -5.7792608787), (6.95, -10.45))
            ThreePointArc((6.95, -10.45), (8, -11.5), (9.05, -10.45))
            Line((9.05, -10.45), (9.05, -5.7792608787))
        make_face()
    extrude(amount=F19_DEPTH)
    extrude(f19_4_sk.sketch, amount=-F19_DEPTH_BACK)


solid = Compound([f1.part, f1b.part, f2.part, f2b.part, f4.part, f10.part, f10b.part, f19.part, f19b.part, f19c.part, f19d.part])
